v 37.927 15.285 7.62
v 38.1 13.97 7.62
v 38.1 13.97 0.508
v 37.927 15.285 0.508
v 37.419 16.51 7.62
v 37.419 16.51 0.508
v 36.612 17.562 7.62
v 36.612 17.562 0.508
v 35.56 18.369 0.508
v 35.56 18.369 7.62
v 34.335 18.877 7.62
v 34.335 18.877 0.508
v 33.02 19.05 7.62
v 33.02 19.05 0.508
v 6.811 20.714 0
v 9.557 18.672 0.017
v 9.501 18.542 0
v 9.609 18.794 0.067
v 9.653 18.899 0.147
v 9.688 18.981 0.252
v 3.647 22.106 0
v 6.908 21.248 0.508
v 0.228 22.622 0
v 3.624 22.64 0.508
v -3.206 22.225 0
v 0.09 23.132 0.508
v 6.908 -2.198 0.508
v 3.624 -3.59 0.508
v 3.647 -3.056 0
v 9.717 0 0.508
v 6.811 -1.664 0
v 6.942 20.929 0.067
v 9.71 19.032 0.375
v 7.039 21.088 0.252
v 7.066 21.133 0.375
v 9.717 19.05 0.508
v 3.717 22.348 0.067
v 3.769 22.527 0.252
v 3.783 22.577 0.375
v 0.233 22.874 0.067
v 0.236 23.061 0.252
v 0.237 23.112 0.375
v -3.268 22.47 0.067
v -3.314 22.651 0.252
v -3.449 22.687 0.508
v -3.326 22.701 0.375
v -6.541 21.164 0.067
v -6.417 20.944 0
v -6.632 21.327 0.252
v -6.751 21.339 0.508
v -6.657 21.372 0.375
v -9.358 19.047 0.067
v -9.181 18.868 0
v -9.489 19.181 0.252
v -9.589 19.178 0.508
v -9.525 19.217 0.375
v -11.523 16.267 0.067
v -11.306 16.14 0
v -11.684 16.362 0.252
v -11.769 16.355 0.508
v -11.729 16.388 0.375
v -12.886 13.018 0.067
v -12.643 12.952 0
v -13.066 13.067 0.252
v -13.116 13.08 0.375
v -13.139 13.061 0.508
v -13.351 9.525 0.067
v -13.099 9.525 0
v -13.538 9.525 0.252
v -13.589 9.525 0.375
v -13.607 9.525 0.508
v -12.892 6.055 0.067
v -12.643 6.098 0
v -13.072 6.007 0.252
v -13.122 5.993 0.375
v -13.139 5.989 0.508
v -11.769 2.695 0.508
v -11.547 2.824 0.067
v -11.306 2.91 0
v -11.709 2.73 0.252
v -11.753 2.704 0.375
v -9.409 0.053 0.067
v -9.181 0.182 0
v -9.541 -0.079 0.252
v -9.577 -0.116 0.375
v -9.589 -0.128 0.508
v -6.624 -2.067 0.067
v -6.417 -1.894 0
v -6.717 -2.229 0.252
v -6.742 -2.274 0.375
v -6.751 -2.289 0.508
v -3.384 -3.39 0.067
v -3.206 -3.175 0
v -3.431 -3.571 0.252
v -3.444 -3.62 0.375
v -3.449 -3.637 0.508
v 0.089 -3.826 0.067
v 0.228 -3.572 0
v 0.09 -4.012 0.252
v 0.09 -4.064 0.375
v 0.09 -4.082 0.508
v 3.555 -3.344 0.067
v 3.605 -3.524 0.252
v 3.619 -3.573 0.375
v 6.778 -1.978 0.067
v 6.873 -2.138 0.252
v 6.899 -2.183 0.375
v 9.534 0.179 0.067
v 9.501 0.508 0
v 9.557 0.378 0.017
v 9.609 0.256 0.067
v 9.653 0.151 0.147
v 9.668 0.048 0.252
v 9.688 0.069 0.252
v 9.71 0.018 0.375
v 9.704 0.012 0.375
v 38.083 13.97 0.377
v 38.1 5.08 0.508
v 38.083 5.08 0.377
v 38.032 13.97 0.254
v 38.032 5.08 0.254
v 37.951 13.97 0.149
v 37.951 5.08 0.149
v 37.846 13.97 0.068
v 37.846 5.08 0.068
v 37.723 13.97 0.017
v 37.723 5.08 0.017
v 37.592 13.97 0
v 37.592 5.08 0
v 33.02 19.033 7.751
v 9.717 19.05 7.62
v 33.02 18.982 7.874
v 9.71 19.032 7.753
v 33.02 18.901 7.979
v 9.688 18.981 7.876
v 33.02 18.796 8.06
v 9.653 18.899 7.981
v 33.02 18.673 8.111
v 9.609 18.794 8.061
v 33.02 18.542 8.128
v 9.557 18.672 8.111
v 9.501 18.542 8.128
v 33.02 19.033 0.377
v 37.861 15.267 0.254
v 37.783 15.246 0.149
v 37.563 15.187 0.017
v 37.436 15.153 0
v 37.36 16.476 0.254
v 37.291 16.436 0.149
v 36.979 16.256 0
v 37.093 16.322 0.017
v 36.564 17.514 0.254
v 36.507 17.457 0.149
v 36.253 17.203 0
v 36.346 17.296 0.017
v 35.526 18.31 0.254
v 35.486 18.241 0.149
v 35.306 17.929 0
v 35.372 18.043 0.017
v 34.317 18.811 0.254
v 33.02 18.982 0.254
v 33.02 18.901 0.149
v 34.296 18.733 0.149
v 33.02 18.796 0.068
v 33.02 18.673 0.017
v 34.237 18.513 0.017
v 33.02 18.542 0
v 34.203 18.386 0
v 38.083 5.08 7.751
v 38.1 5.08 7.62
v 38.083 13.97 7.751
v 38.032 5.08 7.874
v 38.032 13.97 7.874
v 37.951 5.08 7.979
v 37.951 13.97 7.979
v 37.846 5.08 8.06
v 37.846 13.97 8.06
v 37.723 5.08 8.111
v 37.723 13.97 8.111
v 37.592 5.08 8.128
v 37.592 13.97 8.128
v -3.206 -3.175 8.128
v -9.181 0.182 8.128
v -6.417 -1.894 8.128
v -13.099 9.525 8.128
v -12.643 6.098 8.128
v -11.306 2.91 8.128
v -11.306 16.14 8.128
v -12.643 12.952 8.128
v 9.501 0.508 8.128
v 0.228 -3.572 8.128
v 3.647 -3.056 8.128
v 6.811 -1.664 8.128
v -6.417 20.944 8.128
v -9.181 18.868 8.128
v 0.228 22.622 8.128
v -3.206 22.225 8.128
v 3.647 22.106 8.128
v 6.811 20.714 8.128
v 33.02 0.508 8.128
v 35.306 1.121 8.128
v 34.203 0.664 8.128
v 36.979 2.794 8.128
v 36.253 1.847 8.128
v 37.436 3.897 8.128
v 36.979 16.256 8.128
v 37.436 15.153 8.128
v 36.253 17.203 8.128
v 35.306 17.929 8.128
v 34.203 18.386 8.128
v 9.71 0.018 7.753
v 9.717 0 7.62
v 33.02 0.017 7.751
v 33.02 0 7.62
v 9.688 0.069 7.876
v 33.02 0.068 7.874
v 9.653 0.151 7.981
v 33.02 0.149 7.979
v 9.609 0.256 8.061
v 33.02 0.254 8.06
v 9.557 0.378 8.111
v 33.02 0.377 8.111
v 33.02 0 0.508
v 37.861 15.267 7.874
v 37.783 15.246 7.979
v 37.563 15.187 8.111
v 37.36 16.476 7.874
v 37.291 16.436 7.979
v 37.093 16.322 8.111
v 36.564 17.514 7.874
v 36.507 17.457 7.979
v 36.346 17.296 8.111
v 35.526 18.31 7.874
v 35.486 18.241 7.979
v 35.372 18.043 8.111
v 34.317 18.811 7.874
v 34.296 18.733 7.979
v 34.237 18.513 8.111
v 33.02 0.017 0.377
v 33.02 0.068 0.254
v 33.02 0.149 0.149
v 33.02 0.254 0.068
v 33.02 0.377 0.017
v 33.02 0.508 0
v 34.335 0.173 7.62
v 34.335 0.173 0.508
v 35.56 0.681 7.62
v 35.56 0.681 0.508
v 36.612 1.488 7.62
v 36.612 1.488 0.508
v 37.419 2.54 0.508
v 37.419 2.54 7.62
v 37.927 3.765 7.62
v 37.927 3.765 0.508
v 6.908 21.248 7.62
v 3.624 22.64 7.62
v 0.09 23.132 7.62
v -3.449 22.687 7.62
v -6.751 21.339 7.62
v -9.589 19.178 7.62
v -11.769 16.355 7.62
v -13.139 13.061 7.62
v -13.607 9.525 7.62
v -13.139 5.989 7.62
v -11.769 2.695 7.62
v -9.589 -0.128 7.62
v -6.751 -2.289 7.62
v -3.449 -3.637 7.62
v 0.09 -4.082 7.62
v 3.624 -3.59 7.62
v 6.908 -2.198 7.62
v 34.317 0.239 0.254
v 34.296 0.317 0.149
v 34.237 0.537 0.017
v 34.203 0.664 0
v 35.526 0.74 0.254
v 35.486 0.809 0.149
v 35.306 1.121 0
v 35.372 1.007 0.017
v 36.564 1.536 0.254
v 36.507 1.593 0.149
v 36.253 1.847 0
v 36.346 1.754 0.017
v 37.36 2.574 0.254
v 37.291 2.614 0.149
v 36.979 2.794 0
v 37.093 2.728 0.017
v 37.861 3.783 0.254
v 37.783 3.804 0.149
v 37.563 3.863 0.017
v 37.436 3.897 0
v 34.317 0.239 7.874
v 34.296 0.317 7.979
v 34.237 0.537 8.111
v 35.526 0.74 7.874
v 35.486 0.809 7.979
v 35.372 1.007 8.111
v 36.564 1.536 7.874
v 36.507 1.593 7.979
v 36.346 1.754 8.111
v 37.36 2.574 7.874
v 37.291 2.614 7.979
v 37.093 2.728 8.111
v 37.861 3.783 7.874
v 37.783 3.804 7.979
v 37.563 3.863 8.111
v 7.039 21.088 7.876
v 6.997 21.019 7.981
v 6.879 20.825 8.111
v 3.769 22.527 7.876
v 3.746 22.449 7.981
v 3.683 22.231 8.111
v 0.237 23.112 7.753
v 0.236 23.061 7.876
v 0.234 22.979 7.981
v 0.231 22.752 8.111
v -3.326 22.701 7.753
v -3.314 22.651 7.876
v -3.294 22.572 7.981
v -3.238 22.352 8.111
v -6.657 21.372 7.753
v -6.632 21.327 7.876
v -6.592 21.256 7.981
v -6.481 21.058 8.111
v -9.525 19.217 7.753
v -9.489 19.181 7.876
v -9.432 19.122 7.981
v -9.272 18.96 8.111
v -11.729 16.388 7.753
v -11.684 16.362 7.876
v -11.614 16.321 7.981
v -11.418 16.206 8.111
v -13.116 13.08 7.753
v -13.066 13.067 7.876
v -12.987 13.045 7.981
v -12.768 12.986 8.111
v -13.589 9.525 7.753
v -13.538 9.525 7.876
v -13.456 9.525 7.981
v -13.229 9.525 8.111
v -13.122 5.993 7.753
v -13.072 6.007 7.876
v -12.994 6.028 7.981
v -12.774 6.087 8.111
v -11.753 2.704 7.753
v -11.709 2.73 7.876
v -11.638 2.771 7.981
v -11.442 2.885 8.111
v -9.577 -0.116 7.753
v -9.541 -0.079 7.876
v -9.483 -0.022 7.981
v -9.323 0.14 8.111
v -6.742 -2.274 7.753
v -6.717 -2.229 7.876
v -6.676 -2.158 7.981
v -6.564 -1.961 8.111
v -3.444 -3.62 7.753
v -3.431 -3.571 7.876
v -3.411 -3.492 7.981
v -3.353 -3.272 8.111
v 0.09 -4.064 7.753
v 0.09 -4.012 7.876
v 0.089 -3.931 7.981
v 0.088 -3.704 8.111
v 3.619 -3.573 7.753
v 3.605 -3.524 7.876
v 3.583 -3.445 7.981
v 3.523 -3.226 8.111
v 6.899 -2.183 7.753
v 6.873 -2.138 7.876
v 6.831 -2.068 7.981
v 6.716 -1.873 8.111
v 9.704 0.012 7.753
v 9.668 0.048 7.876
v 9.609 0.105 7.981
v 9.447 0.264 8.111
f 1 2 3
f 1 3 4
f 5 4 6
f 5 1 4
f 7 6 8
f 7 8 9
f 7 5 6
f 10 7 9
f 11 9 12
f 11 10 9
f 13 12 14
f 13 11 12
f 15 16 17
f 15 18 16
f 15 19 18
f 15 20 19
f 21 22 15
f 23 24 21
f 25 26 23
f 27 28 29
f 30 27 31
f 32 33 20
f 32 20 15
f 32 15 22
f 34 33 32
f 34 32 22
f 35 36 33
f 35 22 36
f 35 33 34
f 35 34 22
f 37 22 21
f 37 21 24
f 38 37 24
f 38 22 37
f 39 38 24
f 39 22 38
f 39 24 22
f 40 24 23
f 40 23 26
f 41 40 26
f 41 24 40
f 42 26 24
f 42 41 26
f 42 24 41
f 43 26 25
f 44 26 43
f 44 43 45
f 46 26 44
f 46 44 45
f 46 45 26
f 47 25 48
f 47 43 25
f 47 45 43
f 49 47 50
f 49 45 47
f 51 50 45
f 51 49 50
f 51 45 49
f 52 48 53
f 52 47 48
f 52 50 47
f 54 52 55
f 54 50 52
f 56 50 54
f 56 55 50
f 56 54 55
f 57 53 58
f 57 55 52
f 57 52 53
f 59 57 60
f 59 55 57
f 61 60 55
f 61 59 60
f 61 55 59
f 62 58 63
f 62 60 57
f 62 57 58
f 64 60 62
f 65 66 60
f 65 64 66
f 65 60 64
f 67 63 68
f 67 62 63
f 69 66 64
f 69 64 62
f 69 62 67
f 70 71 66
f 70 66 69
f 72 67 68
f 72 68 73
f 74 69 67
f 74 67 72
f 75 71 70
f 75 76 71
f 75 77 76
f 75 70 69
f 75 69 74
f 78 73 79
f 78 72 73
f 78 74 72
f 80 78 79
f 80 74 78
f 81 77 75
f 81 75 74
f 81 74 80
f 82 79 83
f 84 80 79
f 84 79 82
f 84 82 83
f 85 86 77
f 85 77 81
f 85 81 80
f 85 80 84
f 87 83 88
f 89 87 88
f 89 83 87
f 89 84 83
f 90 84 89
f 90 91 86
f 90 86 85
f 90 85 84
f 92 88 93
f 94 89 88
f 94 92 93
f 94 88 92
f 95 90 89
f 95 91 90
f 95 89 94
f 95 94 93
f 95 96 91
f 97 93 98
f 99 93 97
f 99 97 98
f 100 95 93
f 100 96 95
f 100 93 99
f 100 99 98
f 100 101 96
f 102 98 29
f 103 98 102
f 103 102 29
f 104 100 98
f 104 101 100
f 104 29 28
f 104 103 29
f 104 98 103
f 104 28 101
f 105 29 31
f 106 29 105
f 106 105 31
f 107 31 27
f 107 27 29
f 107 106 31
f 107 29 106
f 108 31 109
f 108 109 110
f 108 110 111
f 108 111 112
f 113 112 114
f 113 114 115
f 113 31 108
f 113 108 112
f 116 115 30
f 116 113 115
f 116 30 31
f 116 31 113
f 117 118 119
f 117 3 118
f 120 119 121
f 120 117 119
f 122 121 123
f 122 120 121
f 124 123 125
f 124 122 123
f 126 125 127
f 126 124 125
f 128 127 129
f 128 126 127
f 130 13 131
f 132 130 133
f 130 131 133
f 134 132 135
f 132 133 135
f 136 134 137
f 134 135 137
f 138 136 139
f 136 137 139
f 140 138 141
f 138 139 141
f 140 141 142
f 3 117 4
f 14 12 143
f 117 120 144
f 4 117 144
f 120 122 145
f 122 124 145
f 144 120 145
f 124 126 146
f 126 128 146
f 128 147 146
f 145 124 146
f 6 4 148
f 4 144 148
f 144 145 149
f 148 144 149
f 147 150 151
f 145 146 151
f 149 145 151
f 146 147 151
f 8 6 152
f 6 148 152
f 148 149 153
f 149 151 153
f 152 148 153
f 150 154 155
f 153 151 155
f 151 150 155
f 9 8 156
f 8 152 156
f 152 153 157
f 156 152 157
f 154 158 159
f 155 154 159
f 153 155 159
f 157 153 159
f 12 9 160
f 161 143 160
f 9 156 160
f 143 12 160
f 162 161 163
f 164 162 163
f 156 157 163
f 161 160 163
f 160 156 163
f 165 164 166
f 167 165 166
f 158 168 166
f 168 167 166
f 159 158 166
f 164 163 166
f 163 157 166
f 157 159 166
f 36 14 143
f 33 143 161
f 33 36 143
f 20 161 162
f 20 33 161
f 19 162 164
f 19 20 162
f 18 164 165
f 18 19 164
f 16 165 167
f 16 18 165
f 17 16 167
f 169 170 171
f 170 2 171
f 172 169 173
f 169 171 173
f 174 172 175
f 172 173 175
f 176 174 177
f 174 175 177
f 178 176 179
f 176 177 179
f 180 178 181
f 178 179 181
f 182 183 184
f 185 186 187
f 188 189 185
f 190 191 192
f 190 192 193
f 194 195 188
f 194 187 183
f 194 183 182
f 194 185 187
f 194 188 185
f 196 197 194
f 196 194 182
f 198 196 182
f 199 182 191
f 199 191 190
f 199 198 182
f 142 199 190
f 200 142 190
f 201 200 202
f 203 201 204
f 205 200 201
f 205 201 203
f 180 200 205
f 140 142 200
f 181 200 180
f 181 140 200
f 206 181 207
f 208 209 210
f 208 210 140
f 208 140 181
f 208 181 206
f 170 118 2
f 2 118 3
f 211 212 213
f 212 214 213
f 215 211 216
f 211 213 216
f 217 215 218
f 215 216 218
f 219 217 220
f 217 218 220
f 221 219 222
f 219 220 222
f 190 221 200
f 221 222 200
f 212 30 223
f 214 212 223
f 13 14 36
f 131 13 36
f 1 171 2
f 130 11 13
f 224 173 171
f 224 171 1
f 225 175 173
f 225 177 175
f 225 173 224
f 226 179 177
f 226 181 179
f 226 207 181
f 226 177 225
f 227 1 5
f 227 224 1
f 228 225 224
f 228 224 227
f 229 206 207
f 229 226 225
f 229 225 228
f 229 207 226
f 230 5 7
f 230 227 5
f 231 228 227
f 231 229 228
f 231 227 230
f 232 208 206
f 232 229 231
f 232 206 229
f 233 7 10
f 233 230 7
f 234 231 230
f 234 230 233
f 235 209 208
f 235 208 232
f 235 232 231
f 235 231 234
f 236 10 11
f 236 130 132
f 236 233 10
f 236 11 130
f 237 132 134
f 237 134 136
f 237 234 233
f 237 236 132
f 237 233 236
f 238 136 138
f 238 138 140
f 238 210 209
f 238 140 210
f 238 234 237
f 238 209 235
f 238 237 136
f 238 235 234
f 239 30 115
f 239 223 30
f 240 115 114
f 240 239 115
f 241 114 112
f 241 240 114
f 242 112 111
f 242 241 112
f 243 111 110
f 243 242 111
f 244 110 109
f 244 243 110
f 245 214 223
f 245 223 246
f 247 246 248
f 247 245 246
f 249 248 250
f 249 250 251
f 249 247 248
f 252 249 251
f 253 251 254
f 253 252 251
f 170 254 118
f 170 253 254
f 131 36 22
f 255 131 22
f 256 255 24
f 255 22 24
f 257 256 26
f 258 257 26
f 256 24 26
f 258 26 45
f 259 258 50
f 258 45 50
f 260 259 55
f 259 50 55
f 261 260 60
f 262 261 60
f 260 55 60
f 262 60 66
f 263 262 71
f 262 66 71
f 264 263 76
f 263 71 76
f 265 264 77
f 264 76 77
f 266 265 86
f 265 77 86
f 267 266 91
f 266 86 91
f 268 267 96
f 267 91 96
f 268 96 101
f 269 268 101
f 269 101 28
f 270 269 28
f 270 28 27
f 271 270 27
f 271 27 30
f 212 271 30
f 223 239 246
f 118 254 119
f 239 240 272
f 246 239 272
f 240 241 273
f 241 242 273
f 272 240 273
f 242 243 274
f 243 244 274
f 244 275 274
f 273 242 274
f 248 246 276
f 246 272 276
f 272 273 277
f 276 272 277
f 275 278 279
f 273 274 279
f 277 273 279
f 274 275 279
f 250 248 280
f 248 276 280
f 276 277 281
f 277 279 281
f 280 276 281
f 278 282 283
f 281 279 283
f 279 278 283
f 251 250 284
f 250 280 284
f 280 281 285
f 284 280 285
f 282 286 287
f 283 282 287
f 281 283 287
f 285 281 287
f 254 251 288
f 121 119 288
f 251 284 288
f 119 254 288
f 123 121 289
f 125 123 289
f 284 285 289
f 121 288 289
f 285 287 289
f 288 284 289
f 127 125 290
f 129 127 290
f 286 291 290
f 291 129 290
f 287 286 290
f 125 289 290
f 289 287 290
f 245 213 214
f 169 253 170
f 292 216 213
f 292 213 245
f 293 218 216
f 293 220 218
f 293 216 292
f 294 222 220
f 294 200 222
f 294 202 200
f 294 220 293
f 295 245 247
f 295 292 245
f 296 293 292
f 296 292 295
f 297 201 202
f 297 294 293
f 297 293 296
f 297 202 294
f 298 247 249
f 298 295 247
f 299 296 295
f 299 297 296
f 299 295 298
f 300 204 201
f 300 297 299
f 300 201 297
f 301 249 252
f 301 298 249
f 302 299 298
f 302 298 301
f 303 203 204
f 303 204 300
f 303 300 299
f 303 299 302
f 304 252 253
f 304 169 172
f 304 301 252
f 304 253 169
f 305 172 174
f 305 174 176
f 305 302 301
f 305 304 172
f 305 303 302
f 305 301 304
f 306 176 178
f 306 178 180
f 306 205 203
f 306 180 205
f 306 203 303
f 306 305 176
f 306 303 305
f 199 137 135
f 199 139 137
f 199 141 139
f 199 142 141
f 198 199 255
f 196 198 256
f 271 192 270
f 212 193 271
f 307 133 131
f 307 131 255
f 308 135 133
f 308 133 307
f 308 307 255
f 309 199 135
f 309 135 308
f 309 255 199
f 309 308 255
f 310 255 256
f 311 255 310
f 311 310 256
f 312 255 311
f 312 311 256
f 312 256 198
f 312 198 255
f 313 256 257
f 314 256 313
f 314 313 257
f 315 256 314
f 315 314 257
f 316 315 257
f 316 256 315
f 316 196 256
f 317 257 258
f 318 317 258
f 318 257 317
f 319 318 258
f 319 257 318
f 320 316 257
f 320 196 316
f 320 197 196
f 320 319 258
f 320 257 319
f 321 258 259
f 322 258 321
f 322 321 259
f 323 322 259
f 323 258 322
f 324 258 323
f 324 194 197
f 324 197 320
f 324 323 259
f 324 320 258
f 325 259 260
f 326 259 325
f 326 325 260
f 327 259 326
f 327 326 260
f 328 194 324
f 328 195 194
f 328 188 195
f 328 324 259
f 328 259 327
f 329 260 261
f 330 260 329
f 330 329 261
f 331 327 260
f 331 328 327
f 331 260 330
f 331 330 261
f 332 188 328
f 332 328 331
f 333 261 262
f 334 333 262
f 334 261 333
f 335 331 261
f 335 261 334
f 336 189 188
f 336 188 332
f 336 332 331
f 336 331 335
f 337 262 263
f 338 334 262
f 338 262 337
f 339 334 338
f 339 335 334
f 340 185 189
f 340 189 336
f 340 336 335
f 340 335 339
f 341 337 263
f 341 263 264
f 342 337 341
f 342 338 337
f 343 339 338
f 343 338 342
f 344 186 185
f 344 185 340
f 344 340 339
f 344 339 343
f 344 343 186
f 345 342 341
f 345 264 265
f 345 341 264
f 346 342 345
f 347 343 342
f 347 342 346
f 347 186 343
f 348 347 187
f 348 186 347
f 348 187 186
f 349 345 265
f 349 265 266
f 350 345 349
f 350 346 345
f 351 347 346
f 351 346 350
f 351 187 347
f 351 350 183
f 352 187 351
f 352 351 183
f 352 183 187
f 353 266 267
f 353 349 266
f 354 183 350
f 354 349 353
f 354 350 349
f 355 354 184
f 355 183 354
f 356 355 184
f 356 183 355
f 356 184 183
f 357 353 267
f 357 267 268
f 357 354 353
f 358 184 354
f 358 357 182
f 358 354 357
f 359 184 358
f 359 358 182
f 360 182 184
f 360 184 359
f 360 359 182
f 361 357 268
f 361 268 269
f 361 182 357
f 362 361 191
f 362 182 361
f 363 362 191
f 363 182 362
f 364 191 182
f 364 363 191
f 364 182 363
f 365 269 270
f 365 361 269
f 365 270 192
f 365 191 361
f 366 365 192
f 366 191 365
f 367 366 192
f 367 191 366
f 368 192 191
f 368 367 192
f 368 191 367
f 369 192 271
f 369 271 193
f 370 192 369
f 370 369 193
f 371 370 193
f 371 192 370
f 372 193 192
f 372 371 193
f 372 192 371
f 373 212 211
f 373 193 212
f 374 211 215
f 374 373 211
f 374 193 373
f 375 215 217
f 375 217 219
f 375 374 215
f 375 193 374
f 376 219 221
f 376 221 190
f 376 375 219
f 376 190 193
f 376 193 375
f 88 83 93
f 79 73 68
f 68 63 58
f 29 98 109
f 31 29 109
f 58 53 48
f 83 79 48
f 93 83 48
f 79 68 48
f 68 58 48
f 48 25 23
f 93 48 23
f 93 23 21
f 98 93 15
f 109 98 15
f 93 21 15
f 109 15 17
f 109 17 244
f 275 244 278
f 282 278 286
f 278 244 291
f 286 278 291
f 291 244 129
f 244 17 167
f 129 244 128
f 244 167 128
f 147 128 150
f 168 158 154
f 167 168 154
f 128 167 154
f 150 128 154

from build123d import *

# Parameters (mm, degrees)
F1_DEPTH = 8.128
F2_R     = 5.08
F3_R     = 0.508


with BuildPart() as f1:
    # F0 (on Top) → F1 (new body)
    with BuildSketch(Plane.XY):
        with BuildLine():
            ThreePointArc((9.7169721006, 19.05), (-13.6068060839, 9.525), (9.7169721006, 0))
            Line((9.7169721006, 0), (38.1, 0))
            Line((38.1, 0), (38.1, 19.05))
            Line((38.1, 19.05), (9.7169721006, 19.05))
        make_face()
    extrude(amount=F1_DEPTH)

    # F2
    f2_edges = [f1.edges().sort_by_distance(p)[0] for p in [
        (38.1, 19.05, 4.064),
        (38.1, 0, 4.064),
    ]]
    fillet(f2_edges, radius=F2_R)

    # F3
    f3_edges = [f1.edges().sort_by_distance(p)[0] for p in [
        (-13.606806, 9.525, 8.128),
        (21.368486, 0, 8.128),
        (36.612102, 1.487898, 8.128),
        (38.1, 9.525, 8.128),
        (36.612102, 17.562102, 8.128),
        (21.368486, 19.05, 8.128),
        (-13.606806, 9.525, 0),
        (21.368486, 0, 0),
        (36.612102, 1.487898, 0),
        (38.1, 9.525, 0),
        (21.368486, 19.05, 0),
        (36.612102, 17.562102, 0),
    ]]
    fillet(f3_edges, radius=F3_R)


solid = f1.part
